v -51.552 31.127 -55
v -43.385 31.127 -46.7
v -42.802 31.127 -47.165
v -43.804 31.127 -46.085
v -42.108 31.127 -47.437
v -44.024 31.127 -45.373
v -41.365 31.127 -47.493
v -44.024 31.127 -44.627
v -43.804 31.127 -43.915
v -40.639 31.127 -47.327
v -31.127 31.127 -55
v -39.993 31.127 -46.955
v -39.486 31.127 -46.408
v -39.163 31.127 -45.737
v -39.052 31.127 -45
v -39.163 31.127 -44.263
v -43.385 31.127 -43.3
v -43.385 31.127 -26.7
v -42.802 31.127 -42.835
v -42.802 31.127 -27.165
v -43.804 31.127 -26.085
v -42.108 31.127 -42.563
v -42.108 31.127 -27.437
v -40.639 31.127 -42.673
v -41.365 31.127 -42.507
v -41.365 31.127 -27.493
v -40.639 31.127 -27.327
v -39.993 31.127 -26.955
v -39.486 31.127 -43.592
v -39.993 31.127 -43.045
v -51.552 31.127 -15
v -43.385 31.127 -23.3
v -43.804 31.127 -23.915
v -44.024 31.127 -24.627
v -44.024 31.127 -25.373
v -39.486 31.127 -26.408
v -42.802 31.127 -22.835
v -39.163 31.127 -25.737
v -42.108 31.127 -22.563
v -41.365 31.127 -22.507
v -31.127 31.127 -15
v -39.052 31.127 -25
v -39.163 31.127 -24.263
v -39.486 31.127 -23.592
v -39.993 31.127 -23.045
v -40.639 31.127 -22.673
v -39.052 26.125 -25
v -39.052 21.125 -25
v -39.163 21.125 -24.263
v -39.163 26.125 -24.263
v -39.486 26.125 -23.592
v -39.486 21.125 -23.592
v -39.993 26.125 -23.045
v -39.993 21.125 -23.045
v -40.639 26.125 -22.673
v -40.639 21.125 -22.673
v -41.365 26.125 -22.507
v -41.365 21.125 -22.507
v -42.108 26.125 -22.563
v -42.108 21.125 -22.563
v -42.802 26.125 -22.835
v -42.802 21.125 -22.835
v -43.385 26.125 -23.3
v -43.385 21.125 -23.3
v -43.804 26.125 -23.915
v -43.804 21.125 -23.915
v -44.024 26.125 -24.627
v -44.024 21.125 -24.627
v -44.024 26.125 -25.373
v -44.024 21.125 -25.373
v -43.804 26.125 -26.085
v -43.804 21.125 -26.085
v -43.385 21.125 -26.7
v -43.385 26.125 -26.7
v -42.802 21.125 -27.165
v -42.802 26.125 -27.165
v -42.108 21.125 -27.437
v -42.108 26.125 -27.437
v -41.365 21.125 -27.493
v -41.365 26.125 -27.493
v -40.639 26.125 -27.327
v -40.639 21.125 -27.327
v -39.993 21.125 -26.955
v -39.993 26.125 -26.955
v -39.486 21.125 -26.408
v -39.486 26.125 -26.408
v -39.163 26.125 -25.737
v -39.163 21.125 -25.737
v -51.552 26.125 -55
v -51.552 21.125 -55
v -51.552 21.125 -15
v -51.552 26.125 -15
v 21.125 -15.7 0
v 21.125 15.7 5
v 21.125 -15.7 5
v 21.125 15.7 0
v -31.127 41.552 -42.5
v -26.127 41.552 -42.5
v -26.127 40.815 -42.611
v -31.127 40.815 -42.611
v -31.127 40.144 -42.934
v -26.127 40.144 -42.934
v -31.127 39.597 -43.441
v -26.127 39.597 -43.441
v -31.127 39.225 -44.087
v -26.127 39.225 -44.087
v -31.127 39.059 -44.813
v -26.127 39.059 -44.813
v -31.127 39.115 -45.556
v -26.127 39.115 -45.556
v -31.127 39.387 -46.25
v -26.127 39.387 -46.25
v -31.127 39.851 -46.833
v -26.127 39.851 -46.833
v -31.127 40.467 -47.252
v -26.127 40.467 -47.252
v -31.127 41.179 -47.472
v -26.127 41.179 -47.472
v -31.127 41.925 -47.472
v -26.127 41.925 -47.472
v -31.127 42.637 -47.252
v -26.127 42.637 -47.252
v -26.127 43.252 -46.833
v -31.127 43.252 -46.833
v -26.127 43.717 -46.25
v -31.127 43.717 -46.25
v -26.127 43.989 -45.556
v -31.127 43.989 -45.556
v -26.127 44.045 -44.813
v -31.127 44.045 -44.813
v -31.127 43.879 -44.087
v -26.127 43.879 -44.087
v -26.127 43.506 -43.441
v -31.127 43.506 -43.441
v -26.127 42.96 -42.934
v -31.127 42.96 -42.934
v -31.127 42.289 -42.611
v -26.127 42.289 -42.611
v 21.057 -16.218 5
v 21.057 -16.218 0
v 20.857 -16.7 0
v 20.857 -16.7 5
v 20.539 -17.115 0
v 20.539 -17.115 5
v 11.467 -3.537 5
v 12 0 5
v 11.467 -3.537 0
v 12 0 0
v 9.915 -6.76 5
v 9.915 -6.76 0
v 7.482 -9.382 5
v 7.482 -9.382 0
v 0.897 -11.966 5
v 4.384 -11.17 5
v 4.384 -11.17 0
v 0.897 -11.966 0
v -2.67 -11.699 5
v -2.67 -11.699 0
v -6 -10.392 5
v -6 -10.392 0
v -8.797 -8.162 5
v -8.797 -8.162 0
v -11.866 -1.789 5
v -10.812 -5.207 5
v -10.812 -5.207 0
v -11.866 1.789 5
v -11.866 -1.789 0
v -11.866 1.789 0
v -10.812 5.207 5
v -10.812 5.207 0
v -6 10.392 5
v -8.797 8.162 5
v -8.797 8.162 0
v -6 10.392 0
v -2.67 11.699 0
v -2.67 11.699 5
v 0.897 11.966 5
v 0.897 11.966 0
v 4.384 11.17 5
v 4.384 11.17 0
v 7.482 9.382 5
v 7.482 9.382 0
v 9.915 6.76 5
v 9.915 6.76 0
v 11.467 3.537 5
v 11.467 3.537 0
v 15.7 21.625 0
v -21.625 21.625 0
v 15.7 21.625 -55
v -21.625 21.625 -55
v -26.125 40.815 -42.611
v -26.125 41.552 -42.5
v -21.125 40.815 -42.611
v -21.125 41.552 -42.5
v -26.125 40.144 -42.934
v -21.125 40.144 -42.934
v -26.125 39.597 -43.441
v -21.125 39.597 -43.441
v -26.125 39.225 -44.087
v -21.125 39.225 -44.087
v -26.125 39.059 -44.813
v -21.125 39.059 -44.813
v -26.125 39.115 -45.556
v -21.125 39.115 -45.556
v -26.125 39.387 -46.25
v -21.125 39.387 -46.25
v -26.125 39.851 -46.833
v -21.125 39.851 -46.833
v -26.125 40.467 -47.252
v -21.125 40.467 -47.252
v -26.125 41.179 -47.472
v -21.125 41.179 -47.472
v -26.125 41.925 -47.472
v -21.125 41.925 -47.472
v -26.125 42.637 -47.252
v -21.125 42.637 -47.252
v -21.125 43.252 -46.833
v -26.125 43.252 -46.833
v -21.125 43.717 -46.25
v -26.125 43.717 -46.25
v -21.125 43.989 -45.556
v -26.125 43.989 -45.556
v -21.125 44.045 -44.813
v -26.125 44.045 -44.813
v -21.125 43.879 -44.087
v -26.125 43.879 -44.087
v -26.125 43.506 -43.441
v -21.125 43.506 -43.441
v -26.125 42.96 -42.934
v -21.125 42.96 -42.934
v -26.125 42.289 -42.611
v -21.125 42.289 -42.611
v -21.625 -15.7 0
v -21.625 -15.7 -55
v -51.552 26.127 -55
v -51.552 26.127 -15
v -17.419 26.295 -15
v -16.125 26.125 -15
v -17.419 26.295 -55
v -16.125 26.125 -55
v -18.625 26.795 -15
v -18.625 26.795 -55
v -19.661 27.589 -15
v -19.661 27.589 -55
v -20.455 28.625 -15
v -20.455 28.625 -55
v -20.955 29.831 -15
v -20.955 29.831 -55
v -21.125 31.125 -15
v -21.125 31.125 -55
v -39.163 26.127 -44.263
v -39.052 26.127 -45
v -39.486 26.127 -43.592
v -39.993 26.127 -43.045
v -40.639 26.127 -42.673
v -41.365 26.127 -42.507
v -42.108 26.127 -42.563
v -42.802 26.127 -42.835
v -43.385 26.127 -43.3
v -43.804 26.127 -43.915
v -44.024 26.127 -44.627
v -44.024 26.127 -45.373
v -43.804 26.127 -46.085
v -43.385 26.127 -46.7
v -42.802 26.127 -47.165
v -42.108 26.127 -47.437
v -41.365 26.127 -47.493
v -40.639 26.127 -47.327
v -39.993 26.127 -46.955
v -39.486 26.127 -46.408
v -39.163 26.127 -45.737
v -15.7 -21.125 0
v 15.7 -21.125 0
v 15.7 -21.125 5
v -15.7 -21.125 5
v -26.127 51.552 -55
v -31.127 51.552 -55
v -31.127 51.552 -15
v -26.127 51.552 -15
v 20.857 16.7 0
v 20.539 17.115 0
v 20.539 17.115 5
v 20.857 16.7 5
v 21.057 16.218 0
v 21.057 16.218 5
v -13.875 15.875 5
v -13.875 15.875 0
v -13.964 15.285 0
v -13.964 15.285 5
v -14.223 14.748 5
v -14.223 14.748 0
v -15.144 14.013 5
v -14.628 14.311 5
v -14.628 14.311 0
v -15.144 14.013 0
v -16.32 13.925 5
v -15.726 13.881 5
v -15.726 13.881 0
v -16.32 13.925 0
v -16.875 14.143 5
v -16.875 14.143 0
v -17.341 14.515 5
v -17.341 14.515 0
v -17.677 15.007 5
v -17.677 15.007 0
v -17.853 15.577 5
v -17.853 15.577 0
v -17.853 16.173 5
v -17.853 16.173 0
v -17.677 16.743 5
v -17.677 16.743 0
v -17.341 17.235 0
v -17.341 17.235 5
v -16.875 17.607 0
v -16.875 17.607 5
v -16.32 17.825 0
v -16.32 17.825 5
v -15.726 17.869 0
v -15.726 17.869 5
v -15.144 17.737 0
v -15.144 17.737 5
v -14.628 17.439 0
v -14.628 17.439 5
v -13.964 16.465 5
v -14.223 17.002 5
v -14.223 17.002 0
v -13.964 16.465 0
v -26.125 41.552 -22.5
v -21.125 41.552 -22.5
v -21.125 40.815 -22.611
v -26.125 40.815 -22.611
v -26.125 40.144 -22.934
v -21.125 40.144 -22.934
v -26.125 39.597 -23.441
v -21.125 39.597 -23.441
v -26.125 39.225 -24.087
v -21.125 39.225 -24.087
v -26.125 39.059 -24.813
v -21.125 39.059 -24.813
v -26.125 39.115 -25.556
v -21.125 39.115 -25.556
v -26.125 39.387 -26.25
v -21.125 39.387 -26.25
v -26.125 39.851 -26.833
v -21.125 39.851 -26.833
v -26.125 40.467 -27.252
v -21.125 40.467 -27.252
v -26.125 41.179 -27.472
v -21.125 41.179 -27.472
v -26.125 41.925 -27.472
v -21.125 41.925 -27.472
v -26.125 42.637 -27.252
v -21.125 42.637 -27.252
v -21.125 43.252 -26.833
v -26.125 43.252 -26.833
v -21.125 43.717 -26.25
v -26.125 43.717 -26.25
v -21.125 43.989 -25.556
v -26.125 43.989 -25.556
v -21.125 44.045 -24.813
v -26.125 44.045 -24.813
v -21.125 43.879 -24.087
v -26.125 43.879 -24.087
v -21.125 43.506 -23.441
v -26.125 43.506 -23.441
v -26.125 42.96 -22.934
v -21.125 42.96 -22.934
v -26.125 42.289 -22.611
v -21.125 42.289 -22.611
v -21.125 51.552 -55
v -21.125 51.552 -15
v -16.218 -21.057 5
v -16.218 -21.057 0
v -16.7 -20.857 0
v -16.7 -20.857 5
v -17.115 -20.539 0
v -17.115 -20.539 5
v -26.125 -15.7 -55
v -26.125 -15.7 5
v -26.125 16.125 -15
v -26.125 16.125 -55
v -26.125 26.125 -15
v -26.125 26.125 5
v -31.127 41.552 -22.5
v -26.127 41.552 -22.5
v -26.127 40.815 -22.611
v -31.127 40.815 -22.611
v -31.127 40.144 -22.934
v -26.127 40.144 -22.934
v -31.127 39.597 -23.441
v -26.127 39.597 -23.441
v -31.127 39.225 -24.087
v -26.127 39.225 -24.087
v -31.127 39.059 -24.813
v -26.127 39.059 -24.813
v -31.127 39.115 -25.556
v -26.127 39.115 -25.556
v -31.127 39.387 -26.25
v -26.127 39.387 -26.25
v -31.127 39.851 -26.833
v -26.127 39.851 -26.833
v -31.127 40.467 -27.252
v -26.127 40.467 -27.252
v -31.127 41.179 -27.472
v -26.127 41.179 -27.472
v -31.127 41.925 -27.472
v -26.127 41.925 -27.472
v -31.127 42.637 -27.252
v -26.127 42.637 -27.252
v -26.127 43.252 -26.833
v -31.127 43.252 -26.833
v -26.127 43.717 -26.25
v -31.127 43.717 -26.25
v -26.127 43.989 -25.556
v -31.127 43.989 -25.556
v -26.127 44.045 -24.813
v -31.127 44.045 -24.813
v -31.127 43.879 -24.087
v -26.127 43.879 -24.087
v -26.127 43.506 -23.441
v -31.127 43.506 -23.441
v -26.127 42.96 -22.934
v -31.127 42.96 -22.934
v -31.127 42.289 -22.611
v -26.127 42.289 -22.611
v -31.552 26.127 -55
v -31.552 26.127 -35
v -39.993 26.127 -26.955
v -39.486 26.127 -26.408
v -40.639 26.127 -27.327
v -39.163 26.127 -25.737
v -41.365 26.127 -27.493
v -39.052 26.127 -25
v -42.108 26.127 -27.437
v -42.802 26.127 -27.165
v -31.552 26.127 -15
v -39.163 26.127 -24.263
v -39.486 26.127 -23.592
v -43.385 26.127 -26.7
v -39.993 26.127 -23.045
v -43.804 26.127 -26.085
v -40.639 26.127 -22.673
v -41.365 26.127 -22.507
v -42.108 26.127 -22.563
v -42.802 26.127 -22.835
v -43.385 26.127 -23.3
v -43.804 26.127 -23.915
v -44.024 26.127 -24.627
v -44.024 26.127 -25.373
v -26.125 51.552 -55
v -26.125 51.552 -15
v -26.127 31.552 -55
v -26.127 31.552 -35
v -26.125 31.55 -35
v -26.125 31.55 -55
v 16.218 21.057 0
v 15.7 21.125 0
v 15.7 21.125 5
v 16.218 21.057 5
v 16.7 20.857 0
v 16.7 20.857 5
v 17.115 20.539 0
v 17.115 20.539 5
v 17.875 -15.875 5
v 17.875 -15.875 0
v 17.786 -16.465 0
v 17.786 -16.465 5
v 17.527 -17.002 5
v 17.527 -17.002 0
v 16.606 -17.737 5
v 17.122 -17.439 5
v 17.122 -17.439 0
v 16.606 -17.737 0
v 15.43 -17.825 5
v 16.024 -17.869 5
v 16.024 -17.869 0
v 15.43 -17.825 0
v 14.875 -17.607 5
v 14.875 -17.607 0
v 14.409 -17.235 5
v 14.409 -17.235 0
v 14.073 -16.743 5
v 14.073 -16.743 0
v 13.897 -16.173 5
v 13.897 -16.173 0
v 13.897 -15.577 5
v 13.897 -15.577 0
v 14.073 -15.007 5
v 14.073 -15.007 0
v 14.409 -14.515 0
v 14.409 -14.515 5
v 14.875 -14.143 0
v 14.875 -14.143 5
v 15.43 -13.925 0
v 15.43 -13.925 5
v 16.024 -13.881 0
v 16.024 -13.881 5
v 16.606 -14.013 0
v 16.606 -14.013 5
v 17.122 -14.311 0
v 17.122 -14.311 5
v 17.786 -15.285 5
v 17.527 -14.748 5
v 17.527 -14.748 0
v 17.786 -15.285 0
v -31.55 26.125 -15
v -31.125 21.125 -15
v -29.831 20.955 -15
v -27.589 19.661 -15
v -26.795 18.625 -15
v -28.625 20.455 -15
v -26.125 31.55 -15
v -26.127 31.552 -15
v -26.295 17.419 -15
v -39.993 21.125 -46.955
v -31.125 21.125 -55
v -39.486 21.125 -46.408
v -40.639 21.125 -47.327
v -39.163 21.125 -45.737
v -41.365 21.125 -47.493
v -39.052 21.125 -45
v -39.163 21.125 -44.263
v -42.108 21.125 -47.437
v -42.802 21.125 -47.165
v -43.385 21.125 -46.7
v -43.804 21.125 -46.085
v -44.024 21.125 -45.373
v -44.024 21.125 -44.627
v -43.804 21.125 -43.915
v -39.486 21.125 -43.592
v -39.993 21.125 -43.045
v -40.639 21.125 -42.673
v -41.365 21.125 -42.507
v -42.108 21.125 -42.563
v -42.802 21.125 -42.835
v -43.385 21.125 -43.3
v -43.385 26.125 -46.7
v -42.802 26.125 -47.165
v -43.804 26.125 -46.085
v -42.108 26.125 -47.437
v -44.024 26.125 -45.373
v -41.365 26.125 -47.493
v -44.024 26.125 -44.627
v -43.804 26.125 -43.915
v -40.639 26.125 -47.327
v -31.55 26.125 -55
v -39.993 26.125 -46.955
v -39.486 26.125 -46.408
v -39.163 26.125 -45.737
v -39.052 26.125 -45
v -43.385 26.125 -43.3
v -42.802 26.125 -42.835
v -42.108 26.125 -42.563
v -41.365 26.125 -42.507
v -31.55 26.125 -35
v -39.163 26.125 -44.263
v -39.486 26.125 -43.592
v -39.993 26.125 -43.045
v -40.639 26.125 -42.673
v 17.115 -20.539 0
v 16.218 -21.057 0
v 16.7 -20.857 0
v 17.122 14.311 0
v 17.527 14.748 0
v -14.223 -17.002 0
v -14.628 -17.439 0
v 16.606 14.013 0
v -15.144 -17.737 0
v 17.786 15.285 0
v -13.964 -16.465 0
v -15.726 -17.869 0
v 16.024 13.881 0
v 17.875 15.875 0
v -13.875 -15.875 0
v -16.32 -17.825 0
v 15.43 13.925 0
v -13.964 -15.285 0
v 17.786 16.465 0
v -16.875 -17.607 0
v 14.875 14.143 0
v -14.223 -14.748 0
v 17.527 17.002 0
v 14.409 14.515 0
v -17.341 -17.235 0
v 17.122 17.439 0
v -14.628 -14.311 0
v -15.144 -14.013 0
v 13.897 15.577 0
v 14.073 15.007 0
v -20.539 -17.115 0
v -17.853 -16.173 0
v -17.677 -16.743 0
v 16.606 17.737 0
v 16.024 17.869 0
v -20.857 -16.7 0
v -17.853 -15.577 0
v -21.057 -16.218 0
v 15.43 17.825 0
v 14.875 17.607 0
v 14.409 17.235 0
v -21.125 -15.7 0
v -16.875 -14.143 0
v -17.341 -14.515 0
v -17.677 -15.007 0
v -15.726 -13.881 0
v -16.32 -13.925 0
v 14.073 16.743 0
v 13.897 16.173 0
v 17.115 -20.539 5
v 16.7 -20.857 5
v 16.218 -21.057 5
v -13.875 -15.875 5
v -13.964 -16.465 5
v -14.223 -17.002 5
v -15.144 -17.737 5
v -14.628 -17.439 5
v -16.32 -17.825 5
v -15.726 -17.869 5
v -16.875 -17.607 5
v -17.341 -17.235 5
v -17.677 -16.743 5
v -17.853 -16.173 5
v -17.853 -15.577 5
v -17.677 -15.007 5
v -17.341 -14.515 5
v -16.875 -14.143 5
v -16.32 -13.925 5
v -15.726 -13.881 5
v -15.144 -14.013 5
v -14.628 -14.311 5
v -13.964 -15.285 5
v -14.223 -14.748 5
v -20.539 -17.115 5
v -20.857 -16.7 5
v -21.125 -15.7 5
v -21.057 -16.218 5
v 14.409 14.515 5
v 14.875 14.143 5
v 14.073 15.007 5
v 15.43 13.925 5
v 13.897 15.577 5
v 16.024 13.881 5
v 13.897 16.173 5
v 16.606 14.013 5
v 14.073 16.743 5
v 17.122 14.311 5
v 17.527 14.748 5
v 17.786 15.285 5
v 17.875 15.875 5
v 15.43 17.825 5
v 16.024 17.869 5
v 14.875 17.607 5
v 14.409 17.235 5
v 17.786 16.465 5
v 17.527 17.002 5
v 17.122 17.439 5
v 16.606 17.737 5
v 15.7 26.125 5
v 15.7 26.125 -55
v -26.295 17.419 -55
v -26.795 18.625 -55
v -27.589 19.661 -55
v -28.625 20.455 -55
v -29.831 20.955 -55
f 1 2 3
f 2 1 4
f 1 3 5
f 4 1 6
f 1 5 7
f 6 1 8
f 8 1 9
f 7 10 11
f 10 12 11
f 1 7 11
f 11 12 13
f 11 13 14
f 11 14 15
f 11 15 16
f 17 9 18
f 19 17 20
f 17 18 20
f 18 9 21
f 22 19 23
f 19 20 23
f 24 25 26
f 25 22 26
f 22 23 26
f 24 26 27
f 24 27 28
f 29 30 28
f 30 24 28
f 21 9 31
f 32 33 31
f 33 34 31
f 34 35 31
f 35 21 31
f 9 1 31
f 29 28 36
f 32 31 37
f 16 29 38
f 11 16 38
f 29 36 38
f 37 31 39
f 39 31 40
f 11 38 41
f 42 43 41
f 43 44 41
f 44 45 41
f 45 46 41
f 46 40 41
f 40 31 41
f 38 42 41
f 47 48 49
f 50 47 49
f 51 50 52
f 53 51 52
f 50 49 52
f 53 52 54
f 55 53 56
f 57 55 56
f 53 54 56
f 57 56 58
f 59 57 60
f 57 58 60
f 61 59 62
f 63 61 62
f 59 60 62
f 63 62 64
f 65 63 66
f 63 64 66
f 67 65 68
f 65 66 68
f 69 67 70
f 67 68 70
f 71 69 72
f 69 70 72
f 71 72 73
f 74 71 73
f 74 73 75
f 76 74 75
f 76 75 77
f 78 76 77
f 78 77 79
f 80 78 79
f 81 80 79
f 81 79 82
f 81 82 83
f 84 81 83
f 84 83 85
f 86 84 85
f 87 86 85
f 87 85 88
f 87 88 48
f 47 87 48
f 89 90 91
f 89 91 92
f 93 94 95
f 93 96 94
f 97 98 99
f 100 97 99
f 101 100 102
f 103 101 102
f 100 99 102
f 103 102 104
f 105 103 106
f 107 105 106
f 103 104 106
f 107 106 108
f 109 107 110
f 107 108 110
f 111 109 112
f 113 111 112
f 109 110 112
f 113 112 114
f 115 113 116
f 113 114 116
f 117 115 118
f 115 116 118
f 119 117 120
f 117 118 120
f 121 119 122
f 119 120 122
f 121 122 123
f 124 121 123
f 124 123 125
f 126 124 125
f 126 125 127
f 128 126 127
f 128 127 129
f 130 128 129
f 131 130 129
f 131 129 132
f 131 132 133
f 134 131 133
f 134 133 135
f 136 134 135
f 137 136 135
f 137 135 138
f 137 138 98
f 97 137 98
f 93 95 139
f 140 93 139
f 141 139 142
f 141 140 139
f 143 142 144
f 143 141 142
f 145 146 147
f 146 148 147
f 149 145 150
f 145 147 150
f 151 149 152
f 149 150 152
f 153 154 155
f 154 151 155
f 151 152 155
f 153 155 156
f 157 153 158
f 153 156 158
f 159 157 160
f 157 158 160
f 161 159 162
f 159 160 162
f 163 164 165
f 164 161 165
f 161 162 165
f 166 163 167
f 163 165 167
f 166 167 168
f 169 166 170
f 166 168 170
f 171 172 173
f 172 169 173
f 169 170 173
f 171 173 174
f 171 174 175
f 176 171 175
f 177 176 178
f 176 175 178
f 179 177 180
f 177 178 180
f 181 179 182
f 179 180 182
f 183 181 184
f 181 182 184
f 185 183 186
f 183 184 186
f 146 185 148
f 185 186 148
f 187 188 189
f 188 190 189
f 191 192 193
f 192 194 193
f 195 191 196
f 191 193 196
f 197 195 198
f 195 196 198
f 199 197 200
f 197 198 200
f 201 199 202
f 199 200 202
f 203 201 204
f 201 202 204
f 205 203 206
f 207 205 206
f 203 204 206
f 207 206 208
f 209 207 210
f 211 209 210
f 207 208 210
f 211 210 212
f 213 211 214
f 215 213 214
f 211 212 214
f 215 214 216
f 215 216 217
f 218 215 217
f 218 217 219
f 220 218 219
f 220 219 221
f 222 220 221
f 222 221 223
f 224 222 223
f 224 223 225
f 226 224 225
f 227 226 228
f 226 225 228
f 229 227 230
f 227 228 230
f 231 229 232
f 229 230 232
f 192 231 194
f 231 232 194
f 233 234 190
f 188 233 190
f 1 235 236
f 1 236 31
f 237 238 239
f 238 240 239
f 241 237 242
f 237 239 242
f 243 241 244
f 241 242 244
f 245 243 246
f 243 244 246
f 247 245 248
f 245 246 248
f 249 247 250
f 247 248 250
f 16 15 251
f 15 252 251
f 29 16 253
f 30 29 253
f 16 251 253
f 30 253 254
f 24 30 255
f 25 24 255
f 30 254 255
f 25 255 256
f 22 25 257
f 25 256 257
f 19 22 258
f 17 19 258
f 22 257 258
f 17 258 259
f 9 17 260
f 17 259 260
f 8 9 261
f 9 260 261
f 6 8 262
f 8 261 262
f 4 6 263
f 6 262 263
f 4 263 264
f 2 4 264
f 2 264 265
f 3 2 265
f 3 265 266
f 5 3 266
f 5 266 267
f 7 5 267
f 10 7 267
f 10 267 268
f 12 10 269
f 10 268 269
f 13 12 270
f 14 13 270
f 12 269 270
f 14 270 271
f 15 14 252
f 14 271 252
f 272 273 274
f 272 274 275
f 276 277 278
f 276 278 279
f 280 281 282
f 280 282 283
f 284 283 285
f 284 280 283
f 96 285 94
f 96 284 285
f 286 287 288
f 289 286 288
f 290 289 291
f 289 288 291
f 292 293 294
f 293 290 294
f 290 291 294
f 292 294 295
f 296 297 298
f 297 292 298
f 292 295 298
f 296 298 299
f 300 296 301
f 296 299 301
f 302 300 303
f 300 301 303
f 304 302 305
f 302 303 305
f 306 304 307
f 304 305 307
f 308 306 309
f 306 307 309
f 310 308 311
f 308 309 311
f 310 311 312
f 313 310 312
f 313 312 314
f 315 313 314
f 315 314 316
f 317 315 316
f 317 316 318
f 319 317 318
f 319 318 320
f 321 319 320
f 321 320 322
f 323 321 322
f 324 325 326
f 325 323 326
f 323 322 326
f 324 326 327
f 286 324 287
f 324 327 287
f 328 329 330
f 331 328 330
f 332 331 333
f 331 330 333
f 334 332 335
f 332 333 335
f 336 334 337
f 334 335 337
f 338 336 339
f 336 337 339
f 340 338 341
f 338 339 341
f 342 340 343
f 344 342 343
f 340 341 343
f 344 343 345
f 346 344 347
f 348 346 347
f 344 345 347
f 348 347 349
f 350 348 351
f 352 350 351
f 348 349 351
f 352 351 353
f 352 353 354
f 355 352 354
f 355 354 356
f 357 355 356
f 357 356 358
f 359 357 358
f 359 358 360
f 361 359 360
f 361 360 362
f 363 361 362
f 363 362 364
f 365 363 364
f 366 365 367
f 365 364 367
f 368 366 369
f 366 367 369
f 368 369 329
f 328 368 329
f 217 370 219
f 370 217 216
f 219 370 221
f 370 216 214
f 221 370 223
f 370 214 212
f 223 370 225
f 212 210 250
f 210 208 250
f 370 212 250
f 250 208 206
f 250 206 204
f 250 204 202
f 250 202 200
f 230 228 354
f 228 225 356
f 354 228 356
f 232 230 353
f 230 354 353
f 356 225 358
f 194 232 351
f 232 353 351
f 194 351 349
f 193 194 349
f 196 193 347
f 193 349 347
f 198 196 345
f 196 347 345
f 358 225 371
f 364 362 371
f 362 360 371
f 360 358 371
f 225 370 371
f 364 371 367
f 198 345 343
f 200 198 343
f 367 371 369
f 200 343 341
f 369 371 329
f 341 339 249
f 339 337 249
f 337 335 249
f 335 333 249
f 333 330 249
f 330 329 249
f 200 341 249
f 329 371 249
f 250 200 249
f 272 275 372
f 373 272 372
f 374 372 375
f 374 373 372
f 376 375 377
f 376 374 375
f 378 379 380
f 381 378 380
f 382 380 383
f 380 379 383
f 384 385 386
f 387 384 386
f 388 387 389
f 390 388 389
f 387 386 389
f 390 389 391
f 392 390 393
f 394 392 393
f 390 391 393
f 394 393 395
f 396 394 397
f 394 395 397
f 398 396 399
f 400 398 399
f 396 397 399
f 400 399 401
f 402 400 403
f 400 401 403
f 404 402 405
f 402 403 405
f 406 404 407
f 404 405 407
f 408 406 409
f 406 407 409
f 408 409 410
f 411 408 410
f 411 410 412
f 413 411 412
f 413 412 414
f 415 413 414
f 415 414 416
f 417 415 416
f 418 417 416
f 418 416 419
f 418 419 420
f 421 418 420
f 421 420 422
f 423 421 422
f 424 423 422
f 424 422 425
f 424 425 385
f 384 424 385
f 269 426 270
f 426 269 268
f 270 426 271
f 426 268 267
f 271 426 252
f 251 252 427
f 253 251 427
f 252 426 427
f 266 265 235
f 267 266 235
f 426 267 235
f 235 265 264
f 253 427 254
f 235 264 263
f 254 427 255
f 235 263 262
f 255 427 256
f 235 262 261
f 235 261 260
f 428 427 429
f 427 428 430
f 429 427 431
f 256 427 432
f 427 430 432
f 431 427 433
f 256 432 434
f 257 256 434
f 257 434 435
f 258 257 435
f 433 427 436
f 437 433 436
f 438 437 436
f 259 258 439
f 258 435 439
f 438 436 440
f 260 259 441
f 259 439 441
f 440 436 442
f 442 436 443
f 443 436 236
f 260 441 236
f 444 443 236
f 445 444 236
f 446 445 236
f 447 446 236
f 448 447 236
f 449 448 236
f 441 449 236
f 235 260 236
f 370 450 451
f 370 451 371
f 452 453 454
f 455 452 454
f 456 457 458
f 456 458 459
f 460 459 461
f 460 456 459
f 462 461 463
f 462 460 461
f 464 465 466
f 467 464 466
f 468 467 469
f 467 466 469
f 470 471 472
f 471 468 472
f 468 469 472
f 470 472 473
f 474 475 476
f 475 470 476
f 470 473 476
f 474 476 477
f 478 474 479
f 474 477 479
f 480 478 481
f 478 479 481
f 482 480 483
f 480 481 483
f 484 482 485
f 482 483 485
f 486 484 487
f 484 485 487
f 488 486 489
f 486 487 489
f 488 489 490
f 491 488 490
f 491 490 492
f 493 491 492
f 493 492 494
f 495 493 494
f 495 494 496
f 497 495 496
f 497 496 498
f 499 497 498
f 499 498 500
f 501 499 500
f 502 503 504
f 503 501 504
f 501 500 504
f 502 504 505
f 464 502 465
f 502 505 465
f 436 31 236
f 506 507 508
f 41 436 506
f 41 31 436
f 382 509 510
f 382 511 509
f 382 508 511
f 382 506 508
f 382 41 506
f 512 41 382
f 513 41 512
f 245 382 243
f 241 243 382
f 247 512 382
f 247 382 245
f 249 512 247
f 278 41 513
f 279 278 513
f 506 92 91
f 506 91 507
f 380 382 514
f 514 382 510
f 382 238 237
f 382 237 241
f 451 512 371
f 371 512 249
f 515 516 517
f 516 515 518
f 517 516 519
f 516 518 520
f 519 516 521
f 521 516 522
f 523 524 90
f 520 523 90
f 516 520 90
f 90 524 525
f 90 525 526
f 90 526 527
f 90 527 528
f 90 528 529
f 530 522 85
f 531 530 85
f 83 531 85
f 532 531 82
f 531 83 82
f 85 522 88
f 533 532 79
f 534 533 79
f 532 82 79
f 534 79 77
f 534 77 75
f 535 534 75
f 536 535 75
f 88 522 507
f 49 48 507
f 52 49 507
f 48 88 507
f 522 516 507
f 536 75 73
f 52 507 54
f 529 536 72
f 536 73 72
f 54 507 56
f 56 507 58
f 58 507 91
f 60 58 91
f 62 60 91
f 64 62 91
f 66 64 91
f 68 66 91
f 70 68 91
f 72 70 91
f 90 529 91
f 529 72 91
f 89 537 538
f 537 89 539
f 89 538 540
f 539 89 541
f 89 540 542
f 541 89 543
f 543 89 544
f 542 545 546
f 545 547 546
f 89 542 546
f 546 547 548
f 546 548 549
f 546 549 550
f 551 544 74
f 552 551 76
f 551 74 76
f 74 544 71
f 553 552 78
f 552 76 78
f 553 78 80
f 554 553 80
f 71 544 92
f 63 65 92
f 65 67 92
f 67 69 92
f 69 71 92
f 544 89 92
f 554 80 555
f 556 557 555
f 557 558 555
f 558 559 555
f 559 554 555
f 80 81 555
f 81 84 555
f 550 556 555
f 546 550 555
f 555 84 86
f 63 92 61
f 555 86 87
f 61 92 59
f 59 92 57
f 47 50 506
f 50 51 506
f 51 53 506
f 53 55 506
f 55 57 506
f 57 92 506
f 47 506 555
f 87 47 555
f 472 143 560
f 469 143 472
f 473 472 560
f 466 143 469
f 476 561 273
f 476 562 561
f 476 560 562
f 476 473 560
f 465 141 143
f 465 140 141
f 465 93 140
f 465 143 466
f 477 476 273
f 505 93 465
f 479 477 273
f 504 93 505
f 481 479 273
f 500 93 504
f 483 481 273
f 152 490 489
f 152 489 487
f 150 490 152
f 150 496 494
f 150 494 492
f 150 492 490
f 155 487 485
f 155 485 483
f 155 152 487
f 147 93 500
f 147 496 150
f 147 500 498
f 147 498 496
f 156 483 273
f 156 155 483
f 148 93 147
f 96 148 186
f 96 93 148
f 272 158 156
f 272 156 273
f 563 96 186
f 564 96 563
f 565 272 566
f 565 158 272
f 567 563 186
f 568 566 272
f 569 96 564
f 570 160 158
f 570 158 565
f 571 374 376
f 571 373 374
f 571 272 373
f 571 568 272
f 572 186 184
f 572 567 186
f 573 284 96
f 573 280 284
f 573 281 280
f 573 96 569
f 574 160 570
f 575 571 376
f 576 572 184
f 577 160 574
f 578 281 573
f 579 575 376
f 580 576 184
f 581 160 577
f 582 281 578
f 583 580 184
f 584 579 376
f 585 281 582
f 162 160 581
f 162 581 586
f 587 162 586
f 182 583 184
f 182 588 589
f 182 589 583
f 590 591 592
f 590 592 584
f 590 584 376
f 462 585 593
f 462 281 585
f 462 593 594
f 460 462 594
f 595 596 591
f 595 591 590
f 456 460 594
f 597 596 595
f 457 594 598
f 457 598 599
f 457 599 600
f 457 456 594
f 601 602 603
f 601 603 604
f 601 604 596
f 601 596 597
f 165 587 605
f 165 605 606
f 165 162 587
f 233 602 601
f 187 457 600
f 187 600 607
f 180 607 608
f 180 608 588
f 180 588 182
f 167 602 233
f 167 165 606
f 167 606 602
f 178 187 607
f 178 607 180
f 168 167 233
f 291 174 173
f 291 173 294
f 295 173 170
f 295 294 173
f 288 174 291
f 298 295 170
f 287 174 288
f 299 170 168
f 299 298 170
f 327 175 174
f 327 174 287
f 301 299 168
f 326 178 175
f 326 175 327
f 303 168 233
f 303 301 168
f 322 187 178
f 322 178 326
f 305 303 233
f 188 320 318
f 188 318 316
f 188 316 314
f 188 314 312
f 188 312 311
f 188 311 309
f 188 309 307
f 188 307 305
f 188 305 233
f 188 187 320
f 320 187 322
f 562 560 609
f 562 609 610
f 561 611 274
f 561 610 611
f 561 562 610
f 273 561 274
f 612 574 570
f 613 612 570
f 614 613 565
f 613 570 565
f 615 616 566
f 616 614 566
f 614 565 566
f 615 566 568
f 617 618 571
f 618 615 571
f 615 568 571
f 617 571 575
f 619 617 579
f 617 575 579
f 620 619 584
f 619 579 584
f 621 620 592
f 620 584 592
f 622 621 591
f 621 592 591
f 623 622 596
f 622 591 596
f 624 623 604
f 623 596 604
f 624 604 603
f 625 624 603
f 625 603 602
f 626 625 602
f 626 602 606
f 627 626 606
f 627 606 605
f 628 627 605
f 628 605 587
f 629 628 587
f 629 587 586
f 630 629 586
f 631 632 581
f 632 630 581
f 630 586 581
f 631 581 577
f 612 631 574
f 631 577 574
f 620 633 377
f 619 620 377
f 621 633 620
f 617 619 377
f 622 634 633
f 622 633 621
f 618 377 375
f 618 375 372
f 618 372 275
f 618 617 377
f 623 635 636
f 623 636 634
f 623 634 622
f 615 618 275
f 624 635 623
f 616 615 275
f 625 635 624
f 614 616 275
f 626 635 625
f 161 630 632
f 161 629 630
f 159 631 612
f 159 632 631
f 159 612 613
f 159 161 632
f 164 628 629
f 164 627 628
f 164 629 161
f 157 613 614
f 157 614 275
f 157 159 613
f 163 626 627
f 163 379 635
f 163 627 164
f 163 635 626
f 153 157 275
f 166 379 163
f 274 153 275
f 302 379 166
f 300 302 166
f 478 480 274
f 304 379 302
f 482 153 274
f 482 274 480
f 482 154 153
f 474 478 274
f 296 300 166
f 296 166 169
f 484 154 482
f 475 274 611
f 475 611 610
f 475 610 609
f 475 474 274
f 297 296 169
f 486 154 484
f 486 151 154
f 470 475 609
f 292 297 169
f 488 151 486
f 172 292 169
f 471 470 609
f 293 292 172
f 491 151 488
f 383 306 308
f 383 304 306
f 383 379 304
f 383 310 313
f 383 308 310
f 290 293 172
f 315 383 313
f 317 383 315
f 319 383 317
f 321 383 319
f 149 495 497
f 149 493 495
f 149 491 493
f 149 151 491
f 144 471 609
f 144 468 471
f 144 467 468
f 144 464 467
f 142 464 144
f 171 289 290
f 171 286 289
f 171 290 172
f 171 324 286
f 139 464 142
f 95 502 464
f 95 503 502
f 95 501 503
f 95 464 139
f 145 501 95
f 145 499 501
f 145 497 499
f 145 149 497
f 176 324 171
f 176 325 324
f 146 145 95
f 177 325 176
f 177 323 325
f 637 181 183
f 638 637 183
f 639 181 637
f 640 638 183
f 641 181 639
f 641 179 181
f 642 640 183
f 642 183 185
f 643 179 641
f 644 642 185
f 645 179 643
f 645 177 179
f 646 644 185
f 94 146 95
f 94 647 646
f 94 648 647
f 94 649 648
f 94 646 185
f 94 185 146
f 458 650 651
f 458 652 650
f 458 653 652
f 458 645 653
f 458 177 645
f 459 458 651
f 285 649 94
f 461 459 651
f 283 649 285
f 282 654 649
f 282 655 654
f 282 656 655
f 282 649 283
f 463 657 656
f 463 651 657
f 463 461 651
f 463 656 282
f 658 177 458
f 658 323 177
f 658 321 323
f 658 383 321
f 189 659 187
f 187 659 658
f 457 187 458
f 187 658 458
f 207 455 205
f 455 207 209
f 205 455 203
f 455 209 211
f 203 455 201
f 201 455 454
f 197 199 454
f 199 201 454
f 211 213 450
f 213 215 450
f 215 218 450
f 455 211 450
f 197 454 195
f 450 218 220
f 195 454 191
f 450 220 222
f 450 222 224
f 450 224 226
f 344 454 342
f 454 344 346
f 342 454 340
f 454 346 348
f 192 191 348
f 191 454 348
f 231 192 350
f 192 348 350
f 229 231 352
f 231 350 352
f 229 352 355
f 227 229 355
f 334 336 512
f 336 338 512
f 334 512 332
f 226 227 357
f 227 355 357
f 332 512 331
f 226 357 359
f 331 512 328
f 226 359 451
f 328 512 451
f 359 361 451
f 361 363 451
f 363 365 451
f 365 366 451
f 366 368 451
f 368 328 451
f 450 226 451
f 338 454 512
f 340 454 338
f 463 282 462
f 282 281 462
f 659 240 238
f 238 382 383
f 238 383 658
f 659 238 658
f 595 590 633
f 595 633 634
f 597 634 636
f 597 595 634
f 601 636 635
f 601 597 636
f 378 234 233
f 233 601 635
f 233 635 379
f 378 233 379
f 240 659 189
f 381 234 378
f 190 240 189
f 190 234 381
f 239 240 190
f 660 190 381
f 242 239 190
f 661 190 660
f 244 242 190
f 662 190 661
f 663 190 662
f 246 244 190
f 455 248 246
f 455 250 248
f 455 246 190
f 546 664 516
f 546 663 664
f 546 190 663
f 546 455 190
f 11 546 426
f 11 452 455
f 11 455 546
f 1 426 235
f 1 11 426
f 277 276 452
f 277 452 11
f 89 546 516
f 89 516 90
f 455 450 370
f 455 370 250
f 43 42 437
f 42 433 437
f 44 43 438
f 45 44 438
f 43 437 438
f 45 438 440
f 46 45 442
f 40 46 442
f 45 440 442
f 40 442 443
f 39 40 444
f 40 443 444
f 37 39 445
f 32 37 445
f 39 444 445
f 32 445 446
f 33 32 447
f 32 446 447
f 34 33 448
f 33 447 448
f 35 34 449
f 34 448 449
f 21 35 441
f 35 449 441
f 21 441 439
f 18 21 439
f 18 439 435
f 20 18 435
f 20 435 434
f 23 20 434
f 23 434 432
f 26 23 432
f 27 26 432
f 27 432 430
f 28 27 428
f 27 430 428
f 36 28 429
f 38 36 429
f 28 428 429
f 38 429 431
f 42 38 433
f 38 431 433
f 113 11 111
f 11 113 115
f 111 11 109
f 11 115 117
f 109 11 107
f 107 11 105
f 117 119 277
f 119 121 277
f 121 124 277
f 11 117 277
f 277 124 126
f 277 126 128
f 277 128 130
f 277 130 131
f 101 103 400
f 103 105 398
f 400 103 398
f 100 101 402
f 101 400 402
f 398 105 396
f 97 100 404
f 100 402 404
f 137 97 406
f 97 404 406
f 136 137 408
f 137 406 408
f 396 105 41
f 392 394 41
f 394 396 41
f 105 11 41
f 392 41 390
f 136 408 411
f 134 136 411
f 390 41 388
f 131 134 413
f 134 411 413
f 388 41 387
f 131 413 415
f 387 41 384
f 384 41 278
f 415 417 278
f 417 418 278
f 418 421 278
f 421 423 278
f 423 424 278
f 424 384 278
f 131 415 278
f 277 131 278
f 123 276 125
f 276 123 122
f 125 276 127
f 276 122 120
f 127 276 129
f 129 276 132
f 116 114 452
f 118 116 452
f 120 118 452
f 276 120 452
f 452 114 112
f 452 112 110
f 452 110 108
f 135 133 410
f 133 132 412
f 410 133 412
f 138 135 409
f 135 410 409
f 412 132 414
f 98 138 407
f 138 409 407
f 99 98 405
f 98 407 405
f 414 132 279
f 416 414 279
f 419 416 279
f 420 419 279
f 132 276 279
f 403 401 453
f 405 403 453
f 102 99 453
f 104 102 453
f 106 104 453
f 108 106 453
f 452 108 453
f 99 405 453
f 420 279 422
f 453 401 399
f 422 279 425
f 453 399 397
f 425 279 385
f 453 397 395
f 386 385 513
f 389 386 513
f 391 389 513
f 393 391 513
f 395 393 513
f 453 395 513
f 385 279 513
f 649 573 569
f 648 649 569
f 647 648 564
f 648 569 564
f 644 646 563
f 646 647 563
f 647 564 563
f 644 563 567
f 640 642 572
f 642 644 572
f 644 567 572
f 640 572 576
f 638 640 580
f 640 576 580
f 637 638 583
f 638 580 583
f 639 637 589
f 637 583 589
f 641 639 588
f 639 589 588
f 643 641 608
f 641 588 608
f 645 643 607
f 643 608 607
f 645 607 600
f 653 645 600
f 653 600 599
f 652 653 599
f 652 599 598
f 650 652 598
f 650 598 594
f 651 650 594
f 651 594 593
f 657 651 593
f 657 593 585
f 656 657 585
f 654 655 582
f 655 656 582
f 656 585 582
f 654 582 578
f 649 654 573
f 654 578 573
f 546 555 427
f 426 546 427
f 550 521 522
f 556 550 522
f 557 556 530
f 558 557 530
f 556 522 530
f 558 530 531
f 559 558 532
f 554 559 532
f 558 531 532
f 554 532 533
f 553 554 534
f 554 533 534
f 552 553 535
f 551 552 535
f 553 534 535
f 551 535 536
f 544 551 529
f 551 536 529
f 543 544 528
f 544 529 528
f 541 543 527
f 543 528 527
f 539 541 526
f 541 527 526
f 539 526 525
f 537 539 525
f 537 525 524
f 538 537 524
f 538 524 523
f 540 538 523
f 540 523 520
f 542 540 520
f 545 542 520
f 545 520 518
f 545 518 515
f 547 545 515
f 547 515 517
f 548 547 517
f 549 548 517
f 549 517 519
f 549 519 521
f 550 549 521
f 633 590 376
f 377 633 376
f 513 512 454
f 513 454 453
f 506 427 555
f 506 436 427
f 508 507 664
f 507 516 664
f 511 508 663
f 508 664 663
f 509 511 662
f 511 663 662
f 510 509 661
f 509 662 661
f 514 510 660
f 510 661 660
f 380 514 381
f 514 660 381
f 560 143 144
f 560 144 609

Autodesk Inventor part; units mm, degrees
ref_plane "YZ Plane" through (0, 0, 0) normal (1, 0, 0) x (0, 1, 0)
ref_plane "XZ Plane" through (0, 0, 0) normal (0, 1, 0) x (-1, 0, 0)
ref_plane "XY Plane" through (0, 0, 0) normal (0, 0, 1) x (1, 0, 0)
sketch "Sketch1" plane through (0, 0, 0) normal (0, 0, 1) x (1, 0, 0)
  arc A0 (-20.5392, 17.1146) -> (-21.125, 15.7004) centre (-19.125, 15.7004) ccw projected
  line L0 (-21.125, -15.7004) -> (-21.125, 15.7004) projected
  arc A1 (-21.125, -15.7004) -> (-20.5392, -17.1146) centre (-19.125, -15.7004) ccw projected
  line L1 (-20.5392, -17.1146) -> (-17.1146, -20.5392) projected
  arc A2 (-17.1146, -20.5392) -> (-15.7004, -21.125) centre (-15.7004, -19.125) ccw projected
  line L2 (15.7004, -21.125) -> (-15.7004, -21.125) projected
  arc A3 (15.7004, -21.125) -> (17.1146, -20.5392) centre (15.7004, -19.125) ccw projected
  line L3 (20.5392, -17.1146) -> (17.1146, -20.5392) projected
  arc A4 (20.5392, -17.1146) -> (21.125, -15.7004) centre (19.125, -15.7004) ccw projected
  line L4 (21.125, 15.7004) -> (21.125, -15.7004) projected
  arc A5 (21.125, 15.7004) -> (20.5392, 17.1146) centre (19.125, 15.7004) ccw projected
  line L5 (20.5392, 17.1146) -> (17.1146, 20.5392) projected
  arc A6 (17.1146, 20.5392) -> (15.7004, 21.125) centre (15.7004, 19.125) ccw projected
  line L6 (-15.7004, 21.125) -> (15.7004, 21.125) projected
  arc A7 (-15.7004, 21.125) -> (-17.1146, 20.5392) centre (-15.7004, 19.125) ccw projected
  line L7 (-20.5392, 17.1146) -> (-17.1146, 20.5392) projected
  circle A8 centre (0, 0) radius 16 projected
  circle A9 centre (-15.875, -15.875) radius 1.625 projected
  circle A10 centre (15.875, 15.875) radius 1.625 projected
  circle A11 centre (-15.875, 15.875) radius 1.625 projected
  circle A12 centre (15.875, -15.875) radius 1.625 projected
  circle A13 centre (0, 0) radius 12
  circle A14 centre (-15.875, 15.875) radius 2
  circle A15 centre (15.875, 15.875) radius 2
  circle A16 centre (15.875, -15.875) radius 2
  circle A17 centre (-15.875, -15.875) radius 2
  line L8 (-21.125, -15.7004) -> (-29.125, -15.7004)
  line L9 (-29.125, -15.7004) -> (-29.125, 21.125)
  line L10 (-29.125, 21.125) -> (-21.125, 21.125)
  line L11 (-21.125, 21.125) -> (-21.125, -15.7004)
  line L12 (15.7004, 21.125) -> (-29.125, 21.125)
  line L13 (-29.125, 21.125) -> (-29.125, 29.125)
  line L14 (-29.125, 29.125) -> (15.7004, 29.125)
  line L15 (15.7004, 29.125) -> (15.7004, 21.125)
  point P0 (0, 0)
  dimension "d0" = 24
  dimension "d1" = 4
  dimension "d2" = 4
  dimension "d3" = 4
  dimension "d4" = 4
  dimension "d77" = 8
  dimension "d78" = 8
extrude "Extrusion1" add sketch "Sketch1" along normal blind 5 contours L7 A7 L6 A6 L5 A5 L4 A4 L3 A3 L2 A2 L1 A1 L0 A0 | A8
sketch "Sketch3" plane through (0, 0, 5) normal (0, 0, 1) x (1, 0, 0)
  line L0 (-15.7004, 21.125) -> (15.7004, 21.125) projected
  line L1 (15.7004, 21.125) -> (-51.5519, 21.125)
  line L2 (-51.5519, 21.125) -> (-51.5519, 26.125)
  line L3 (-51.5519, 26.125) -> (15.7004, 26.125)
  line L4 (15.7004, 26.125) -> (15.7004, 21.125)
  line L5 (-21.125, 15.7004) -> (-21.125, -15.7004) projected
  line L6 (-21.125, -15.7004) -> (-26.125, -15.7004)
  line L7 (-26.125, -15.7004) -> (-26.125, 51.5519)
  line L8 (-26.125, 51.5519) -> (-21.125, 51.5519)
  line L9 (-21.125, 51.5519) -> (-21.125, -15.7004)
  arc A0 (-20.5392, 17.1146) -> (-21.125, 15.7004) centre (-19.125, 15.7004) ccw projected
  line L10 (15.7004, 21.125) -> (-15.7004, 21.125) projected
  line L11 (-21.125, 15.7004) -> (-15.7004, 21.125)
  line L12 (-15.7004, 21.125) -> (-26.1272, 31.5519)
  line L13 (-26.1272, 31.5519) -> (-31.5519, 26.1272)
  line L14 (-31.5519, 26.1272) -> (-21.125, 15.7004)
  line L15 (-31.5519, 26.1272) -> (-51.5519, 26.1272)
  line L16 (-51.5519, 26.1272) -> (-51.5519, 31.1272)
  line L17 (-51.5519, 31.1272) -> (-31.5519, 31.1272)
  line L18 (-31.5519, 31.1272) -> (-31.5519, 26.1272)
  line L19 (-26.1272, 31.5519) -> (-31.1272, 31.5519)
  line L20 (-31.1272, 31.5519) -> (-31.1272, 51.5519)
  line L21 (-31.1272, 51.5519) -> (-26.1272, 51.5519)
  line L22 (-26.1272, 51.5519) -> (-26.1272, 31.5519)
  line L23 (-31.5519, 31.1272) -> (-31.1272, 31.1272)
  line L24 (-31.1272, 31.1272) -> (-31.1272, 31.5519)
  point P0 (0, 0)
  point P1 (-31.5496, 26.125)
  point P2 (-26.125, 21.125)
  point P3 (-21.125, 21.125)
  point P4 (-21.125, 26.125)
  point P5 (-26.125, 31.5496)
  dimension "d11" = 5
  dimension "d12" = 5
  dimension "d79" = 5
  dimension "d80" = 5
  dimension "d81" = 20
  dimension "d82" = 20
  dimension "d83" = 0
  dimension "d84" = 0
extrude "Extrusion3" add sketch "Sketch3" against normal blind 40 contours L12 L3 L4 L0 | L1 L9 L3 L12 | L9 L14 L7 L1 | L1 L7 L3 L9 | L5 L6 L7 L14 | L1 L14 L3 L7 | L3 L7 L12 L9 | L12 L7 L8 L9 | L1 L2 L3 L14 | L3 L14 L13 L12 L7 | L13 L18 L23 L24 L19 | L19 L20 L21 L22 | L15 L16 L17 L18
sketch "Sketch4" plane through (0, 0, 5) normal (0, 0, 1) x (1, 0, 0)
  arc A0 (-15.7004, 21.125) -> (-17.1146, 20.5392) centre (-15.7004, 19.125) ccw projected
  line L0 (-17.1146, 20.5392) -> (-20.5392, 17.1146) projected
  arc A1 (-20.5392, 17.1146) -> (-21.125, 15.7004) centre (-19.125, 15.7004) ccw projected
  line L1 (-21.125, 26.125) -> (-21.125, 51.5519) projected
  line L2 (-51.5519, 21.125) -> (-26.125, 21.125) projected
  circle A2 centre (0, 0) radius 12 projected
  circle A3 centre (-15.875, -15.875) radius 2 projected
  circle A4 centre (15.875, -15.875) radius 2 projected
  circle A5 centre (15.875, 15.875) radius 2 projected
  circle A6 centre (-15.875, 15.875) radius 2 projected
  line L3 (15.7004, 21.125) -> (15.7004, 26.125) projected
  line L4 (15.7004, 26.125) -> (-21.125, 26.125) projected
  line L5 (-21.125, 51.5519) -> (-26.125, 51.5519) projected
  line L6 (-26.125, 51.5519) -> (-26.125, 31.5496) projected
  line L7 (-31.5496, 26.125) -> (-51.5519, 26.125) projected
  line L8 (-51.5519, 26.125) -> (-51.5519, 21.125) projected
  line L9 (-26.125, 21.125) -> (-26.125, -15.7004) projected
  line L10 (-26.125, -15.7004) -> (-21.125, -15.7004) projected
  arc A7 (-21.125, -15.7004) -> (-20.5392, -17.1146) centre (-19.125, -15.7004) ccw projected
  line L11 (-20.5392, -17.1146) -> (-17.1146, -20.5392) projected
  arc A8 (-17.1146, -20.5392) -> (-15.7004, -21.125) centre (-15.7004, -19.125) ccw projected
  line L12 (-15.7004, -21.125) -> (15.7004, -21.125) projected
  arc A9 (15.7004, -21.125) -> (17.1146, -20.5392) centre (15.7004, -19.125) ccw projected
  line L13 (17.1146, -20.5392) -> (20.5392, -17.1146) projected
  arc A10 (20.5392, -17.1146) -> (21.125, -15.7004) centre (19.125, -15.7004) ccw projected
  line L14 (21.125, -15.7004) -> (21.125, 15.7004) projected
  arc A11 (21.125, 15.7004) -> (20.5392, 17.1146) centre (19.125, 15.7004) ccw projected
  line L15 (20.5392, 17.1146) -> (17.1146, 20.5392) projected
  arc A12 (17.1146, 20.5392) -> (15.7004, 21.125) centre (15.7004, 19.125) ccw projected
  line L16 (-26.125, 31.5496) -> (-26.1272, 31.5519) projected
  line L17 (-26.1272, 31.5519) -> (-26.1272, 51.5519) projected
  line L18 (-26.1272, 51.5519) -> (-31.1272, 51.5519) projected
  line L19 (-31.1272, 51.5519) -> (-31.1272, 31.1272) projected
  line L20 (-31.1272, 31.1272) -> (-51.5519, 31.1272) projected
  line L21 (-51.5519, 31.1272) -> (-51.5519, 26.1272) projected
  line L22 (-51.5519, 26.1272) -> (-31.5519, 26.1272) projected
  line L23 (-31.5519, 26.1272) -> (-31.5496, 26.125) projected
  line L24 (-21.125, 15.7004) -> (-21.125, 21.125) projected
  line L25 (-21.125, 21.125) -> (-15.7004, 21.125) projected
  point P0 (0, 0)
extrude "Extrusion4" add sketch "Sketch4" against normal blind 5 contours A0 L0 A1 L24 L25
sketch "Sketch11" plane through (0, 0, 5) normal (0, 0, 1) x (1, 0, 0)
  line L0 (-26.125, 21.125) -> (-26.125, 51.5519) projected
  line L1 (-26.125, 26.125) -> (-19.1264, 26.125)
  line L2 (-19.1264, 26.125) -> (-19.1264, 59.1574)
  line L3 (-19.1264, 59.1574) -> (-26.125, 59.1574)
  line L4 (-26.125, 59.1574) -> (-26.125, 26.125)
  line L5 (-51.5519, 26.125) -> (-51.5519, 21.125) projected
  line L6 (-51.5519, 26.125) -> (-26.125, 26.125)
  line L7 (-26.125, 26.125) -> (-26.125, 13.3287)
  line L8 (-26.125, 13.3287) -> (-51.5519, 13.3287)
  line L9 (-51.5519, 13.3287) -> (-51.5519, 26.125)
  line L10 (-26.125, 26.125) -> (-55.9242, 26.125)
  line L11 (-55.9242, 26.125) -> (-55.9242, 63.8305)
  line L12 (-55.9242, 63.8305) -> (-26.125, 63.8305)
  line L13 (-26.125, 63.8305) -> (-26.125, 26.125)
  point P0 (0, 0)
  point P1 (-26.125, 46.125)
extrude "Extrusion9" cut sketch "Sketch11" against normal blind 20
sketch "Sketch7" plane through (0, 0, -35) normal (0, 0, -1) x (-1, 0, 0)
  line L0 (21.625, 21.625) -> (-23.2924, 21.625)
  line L1 (-23.2924, 21.625) -> (-23.2924, -21.9013)
  line L2 (-23.2924, -21.9013) -> (21.625, -21.9013)
  line L3 (21.625, -21.9013) -> (21.625, 21.625)
  line L4 (-15.7004, 21.125) -> (51.5519, 21.125) projected
  line L5 (21.125, 51.5519) -> (21.125, -15.7004) projected
  point P0 (0, 0)
  point P1 (21.125, 21.125)
  dimension "d35" = 0.5
  dimension "d36" = 0.5
extrude "Extrusion7" cut sketch "Sketch7" against normal blind 35
sketch "Sketch12" plane through (0, 0, -35) normal (0, 0, -1) x (-1, 0, 0)
  line L0 (51.5519, 21.125) -> (51.5519, 26.125) projected
  line L1 (-15.7004, 26.125) -> (26.125, 26.125) projected
  line L2 (51.5519, 21.125) -> (27.0552, 21.125)
  line L3 (27.0552, 21.125) -> (27.0552, 26.125)
  line L4 (27.0552, 26.125) -> (51.5519, 26.125)
  line L5 (51.5519, 26.125) -> (51.5519, 21.125)
  line L6 (26.125, 51.5519) -> (21.125, 51.5519) projected
  line L7 (-15.7004, 21.625) -> (21.625, 21.625) projected
  line L8 (26.125, 51.5519) -> (21.125, 51.5519)
  line L9 (21.125, 51.5519) -> (21.125, 21.625)
  line L10 (21.125, 21.625) -> (26.125, 21.625)
  line L11 (26.125, 21.625) -> (26.125, 51.5519)
  line L12 (51.5519, 26.125) -> (31.5496, 26.125) projected
  line L13 (21.125, 51.5519) -> (21.125, 26.125) projected
  line L14 (26.125, 51.5519) -> (21.125, 51.5519) projected
  line L15 (26.125, 31.5496) -> (26.125, 51.5519) projected
  line L16 (26.1272, 31.5519) -> (26.125, 31.5496) projected
  line L17 (26.1272, 51.5519) -> (26.1272, 31.5519) projected
  line L18 (31.1272, 51.5519) -> (26.1272, 51.5519) projected
  line L19 (31.1272, 31.1272) -> (31.1272, 51.5519) projected
  line L20 (51.5519, 31.1272) -> (31.1272, 31.1272) projected
  line L21 (51.5519, 26.1272) -> (51.5519, 31.1272) projected
  line L22 (31.5519, 26.1272) -> (51.5519, 26.1272) projected
  line L23 (31.5496, 26.125) -> (31.5519, 26.1272) projected
  line L24 (51.5519, 26.125) -> (31.5496, 26.125) projected
  line L25 (51.5519, 21.125) -> (51.5519, 26.125) projected
  line L26 (26.125, 21.125) -> (51.5519, 21.125) projected
  line L27 (26.125, 26.125) -> (26.125, 21.125) projected
  line L28 (21.125, 26.125) -> (26.125, 26.125) projected
  point P0 (0, 0)
  point P1 (51.5519, 26.125)
  point P2 (26.125, 26.125)
  point P3 (21.125, 51.5519)
  point P4 (21.125, 26.125)
  dimension "d54" = 5
  dimension "d55" = 5
  dimension "d56" = 4.5
  dimension "d57" = 0.5
extrude "Extrusion10" add sketch "Sketch12" along normal blind 20
sketch "Sketch13" plane through (-51.5519, 21.125, -15) normal (0, -1, 0) x (1, 0, 0)
  circle A0 centre (10, -30) radius 2.5
  circle A1 centre (10, -10) radius 2.5
  line L0 (24.4966, -40) -> (0, -40) projected
  line L1 (0, 0) -> (0, -40) projected
  point P0 (51.5519, 15)
  point P1 (0, -20)
  dimension "d60" = 10
  dimension "d61" = 10
  dimension "d62" = 5
  dimension "d63" = 5
  dimension "d64" = 20
  dimension "d65" = 10
extrude "Extrusion11" cut sketch "Sketch13" against normal blind 20
sketch "Sketch14" plane through (-21.125, 26.125, -15) normal (-1, 0, 0) x (0, 0, 1)
  circle A0 centre (-10, 15.4269) radius 2.5
  circle A1 centre (-30, 15.4269) radius 2.5
  line L0 (0, 5.4246) -> (0, 25.4269) projected
  line L1 (0, 25.4269) -> (-40, 25.4269) projected
  point P0 (15, -26.125)
  point P1 (0, 0)
  point P2 (20, 25.4269)
  point P3 (-20, 25.4269)
  dimension "d68" = 10
  dimension "d69" = 10
  dimension "d70" = 20
  dimension "d71" = 10
  dimension "d72" = 5
  dimension "d73" = 5
extrude "Extrusion12" cut sketch "Sketch14" along normal mid plane 40
fillet "Fillet1" radius 5 2 edges at (-21.125, 26.125, -25) (-26.125, 21.125, -25)
sketch "Sketch15" plane through (0, 0, -35) normal (0, 0, -1) x (-1, 0, 0)
  line L0 (21.125, 21.625) -> (21.125, 31.125) projected
  arc A0 (16.125, 26.125) -> (21.125, 31.125) centre (16.125, 31.125) ccw projected
  line L1 (16.125, 26.125) -> (-15.7004, 26.125) projected
  line L2 (-15.7004, 26.125) -> (-15.7004, 21.625) projected
  line L3 (-15.7004, 21.625) -> (21.125, 21.625) projected
  line L4 (26.125, 21.125) -> (26.125, 21.625) projected
  line L5 (26.125, 21.625) -> (21.625, 21.625) projected
  line L6 (21.625, 21.625) -> (21.625, -15.7004) projected
  line L7 (21.625, -15.7004) -> (26.125, -15.7004) projected
  line L8 (26.125, -15.7004) -> (26.125, 16.125) projected
  arc A1 (31.125, 21.125) -> (26.125, 16.125) centre (31.125, 16.125) ccw projected
  line L9 (26.125, 21.125) -> (31.125, 21.125) projected
  point P0 (0, 0)
extrude "Extrusion13" add sketch "Sketch15" along normal blind 20
equation "\"d36\" = d35"
properties part number "StepperXYHolder"
